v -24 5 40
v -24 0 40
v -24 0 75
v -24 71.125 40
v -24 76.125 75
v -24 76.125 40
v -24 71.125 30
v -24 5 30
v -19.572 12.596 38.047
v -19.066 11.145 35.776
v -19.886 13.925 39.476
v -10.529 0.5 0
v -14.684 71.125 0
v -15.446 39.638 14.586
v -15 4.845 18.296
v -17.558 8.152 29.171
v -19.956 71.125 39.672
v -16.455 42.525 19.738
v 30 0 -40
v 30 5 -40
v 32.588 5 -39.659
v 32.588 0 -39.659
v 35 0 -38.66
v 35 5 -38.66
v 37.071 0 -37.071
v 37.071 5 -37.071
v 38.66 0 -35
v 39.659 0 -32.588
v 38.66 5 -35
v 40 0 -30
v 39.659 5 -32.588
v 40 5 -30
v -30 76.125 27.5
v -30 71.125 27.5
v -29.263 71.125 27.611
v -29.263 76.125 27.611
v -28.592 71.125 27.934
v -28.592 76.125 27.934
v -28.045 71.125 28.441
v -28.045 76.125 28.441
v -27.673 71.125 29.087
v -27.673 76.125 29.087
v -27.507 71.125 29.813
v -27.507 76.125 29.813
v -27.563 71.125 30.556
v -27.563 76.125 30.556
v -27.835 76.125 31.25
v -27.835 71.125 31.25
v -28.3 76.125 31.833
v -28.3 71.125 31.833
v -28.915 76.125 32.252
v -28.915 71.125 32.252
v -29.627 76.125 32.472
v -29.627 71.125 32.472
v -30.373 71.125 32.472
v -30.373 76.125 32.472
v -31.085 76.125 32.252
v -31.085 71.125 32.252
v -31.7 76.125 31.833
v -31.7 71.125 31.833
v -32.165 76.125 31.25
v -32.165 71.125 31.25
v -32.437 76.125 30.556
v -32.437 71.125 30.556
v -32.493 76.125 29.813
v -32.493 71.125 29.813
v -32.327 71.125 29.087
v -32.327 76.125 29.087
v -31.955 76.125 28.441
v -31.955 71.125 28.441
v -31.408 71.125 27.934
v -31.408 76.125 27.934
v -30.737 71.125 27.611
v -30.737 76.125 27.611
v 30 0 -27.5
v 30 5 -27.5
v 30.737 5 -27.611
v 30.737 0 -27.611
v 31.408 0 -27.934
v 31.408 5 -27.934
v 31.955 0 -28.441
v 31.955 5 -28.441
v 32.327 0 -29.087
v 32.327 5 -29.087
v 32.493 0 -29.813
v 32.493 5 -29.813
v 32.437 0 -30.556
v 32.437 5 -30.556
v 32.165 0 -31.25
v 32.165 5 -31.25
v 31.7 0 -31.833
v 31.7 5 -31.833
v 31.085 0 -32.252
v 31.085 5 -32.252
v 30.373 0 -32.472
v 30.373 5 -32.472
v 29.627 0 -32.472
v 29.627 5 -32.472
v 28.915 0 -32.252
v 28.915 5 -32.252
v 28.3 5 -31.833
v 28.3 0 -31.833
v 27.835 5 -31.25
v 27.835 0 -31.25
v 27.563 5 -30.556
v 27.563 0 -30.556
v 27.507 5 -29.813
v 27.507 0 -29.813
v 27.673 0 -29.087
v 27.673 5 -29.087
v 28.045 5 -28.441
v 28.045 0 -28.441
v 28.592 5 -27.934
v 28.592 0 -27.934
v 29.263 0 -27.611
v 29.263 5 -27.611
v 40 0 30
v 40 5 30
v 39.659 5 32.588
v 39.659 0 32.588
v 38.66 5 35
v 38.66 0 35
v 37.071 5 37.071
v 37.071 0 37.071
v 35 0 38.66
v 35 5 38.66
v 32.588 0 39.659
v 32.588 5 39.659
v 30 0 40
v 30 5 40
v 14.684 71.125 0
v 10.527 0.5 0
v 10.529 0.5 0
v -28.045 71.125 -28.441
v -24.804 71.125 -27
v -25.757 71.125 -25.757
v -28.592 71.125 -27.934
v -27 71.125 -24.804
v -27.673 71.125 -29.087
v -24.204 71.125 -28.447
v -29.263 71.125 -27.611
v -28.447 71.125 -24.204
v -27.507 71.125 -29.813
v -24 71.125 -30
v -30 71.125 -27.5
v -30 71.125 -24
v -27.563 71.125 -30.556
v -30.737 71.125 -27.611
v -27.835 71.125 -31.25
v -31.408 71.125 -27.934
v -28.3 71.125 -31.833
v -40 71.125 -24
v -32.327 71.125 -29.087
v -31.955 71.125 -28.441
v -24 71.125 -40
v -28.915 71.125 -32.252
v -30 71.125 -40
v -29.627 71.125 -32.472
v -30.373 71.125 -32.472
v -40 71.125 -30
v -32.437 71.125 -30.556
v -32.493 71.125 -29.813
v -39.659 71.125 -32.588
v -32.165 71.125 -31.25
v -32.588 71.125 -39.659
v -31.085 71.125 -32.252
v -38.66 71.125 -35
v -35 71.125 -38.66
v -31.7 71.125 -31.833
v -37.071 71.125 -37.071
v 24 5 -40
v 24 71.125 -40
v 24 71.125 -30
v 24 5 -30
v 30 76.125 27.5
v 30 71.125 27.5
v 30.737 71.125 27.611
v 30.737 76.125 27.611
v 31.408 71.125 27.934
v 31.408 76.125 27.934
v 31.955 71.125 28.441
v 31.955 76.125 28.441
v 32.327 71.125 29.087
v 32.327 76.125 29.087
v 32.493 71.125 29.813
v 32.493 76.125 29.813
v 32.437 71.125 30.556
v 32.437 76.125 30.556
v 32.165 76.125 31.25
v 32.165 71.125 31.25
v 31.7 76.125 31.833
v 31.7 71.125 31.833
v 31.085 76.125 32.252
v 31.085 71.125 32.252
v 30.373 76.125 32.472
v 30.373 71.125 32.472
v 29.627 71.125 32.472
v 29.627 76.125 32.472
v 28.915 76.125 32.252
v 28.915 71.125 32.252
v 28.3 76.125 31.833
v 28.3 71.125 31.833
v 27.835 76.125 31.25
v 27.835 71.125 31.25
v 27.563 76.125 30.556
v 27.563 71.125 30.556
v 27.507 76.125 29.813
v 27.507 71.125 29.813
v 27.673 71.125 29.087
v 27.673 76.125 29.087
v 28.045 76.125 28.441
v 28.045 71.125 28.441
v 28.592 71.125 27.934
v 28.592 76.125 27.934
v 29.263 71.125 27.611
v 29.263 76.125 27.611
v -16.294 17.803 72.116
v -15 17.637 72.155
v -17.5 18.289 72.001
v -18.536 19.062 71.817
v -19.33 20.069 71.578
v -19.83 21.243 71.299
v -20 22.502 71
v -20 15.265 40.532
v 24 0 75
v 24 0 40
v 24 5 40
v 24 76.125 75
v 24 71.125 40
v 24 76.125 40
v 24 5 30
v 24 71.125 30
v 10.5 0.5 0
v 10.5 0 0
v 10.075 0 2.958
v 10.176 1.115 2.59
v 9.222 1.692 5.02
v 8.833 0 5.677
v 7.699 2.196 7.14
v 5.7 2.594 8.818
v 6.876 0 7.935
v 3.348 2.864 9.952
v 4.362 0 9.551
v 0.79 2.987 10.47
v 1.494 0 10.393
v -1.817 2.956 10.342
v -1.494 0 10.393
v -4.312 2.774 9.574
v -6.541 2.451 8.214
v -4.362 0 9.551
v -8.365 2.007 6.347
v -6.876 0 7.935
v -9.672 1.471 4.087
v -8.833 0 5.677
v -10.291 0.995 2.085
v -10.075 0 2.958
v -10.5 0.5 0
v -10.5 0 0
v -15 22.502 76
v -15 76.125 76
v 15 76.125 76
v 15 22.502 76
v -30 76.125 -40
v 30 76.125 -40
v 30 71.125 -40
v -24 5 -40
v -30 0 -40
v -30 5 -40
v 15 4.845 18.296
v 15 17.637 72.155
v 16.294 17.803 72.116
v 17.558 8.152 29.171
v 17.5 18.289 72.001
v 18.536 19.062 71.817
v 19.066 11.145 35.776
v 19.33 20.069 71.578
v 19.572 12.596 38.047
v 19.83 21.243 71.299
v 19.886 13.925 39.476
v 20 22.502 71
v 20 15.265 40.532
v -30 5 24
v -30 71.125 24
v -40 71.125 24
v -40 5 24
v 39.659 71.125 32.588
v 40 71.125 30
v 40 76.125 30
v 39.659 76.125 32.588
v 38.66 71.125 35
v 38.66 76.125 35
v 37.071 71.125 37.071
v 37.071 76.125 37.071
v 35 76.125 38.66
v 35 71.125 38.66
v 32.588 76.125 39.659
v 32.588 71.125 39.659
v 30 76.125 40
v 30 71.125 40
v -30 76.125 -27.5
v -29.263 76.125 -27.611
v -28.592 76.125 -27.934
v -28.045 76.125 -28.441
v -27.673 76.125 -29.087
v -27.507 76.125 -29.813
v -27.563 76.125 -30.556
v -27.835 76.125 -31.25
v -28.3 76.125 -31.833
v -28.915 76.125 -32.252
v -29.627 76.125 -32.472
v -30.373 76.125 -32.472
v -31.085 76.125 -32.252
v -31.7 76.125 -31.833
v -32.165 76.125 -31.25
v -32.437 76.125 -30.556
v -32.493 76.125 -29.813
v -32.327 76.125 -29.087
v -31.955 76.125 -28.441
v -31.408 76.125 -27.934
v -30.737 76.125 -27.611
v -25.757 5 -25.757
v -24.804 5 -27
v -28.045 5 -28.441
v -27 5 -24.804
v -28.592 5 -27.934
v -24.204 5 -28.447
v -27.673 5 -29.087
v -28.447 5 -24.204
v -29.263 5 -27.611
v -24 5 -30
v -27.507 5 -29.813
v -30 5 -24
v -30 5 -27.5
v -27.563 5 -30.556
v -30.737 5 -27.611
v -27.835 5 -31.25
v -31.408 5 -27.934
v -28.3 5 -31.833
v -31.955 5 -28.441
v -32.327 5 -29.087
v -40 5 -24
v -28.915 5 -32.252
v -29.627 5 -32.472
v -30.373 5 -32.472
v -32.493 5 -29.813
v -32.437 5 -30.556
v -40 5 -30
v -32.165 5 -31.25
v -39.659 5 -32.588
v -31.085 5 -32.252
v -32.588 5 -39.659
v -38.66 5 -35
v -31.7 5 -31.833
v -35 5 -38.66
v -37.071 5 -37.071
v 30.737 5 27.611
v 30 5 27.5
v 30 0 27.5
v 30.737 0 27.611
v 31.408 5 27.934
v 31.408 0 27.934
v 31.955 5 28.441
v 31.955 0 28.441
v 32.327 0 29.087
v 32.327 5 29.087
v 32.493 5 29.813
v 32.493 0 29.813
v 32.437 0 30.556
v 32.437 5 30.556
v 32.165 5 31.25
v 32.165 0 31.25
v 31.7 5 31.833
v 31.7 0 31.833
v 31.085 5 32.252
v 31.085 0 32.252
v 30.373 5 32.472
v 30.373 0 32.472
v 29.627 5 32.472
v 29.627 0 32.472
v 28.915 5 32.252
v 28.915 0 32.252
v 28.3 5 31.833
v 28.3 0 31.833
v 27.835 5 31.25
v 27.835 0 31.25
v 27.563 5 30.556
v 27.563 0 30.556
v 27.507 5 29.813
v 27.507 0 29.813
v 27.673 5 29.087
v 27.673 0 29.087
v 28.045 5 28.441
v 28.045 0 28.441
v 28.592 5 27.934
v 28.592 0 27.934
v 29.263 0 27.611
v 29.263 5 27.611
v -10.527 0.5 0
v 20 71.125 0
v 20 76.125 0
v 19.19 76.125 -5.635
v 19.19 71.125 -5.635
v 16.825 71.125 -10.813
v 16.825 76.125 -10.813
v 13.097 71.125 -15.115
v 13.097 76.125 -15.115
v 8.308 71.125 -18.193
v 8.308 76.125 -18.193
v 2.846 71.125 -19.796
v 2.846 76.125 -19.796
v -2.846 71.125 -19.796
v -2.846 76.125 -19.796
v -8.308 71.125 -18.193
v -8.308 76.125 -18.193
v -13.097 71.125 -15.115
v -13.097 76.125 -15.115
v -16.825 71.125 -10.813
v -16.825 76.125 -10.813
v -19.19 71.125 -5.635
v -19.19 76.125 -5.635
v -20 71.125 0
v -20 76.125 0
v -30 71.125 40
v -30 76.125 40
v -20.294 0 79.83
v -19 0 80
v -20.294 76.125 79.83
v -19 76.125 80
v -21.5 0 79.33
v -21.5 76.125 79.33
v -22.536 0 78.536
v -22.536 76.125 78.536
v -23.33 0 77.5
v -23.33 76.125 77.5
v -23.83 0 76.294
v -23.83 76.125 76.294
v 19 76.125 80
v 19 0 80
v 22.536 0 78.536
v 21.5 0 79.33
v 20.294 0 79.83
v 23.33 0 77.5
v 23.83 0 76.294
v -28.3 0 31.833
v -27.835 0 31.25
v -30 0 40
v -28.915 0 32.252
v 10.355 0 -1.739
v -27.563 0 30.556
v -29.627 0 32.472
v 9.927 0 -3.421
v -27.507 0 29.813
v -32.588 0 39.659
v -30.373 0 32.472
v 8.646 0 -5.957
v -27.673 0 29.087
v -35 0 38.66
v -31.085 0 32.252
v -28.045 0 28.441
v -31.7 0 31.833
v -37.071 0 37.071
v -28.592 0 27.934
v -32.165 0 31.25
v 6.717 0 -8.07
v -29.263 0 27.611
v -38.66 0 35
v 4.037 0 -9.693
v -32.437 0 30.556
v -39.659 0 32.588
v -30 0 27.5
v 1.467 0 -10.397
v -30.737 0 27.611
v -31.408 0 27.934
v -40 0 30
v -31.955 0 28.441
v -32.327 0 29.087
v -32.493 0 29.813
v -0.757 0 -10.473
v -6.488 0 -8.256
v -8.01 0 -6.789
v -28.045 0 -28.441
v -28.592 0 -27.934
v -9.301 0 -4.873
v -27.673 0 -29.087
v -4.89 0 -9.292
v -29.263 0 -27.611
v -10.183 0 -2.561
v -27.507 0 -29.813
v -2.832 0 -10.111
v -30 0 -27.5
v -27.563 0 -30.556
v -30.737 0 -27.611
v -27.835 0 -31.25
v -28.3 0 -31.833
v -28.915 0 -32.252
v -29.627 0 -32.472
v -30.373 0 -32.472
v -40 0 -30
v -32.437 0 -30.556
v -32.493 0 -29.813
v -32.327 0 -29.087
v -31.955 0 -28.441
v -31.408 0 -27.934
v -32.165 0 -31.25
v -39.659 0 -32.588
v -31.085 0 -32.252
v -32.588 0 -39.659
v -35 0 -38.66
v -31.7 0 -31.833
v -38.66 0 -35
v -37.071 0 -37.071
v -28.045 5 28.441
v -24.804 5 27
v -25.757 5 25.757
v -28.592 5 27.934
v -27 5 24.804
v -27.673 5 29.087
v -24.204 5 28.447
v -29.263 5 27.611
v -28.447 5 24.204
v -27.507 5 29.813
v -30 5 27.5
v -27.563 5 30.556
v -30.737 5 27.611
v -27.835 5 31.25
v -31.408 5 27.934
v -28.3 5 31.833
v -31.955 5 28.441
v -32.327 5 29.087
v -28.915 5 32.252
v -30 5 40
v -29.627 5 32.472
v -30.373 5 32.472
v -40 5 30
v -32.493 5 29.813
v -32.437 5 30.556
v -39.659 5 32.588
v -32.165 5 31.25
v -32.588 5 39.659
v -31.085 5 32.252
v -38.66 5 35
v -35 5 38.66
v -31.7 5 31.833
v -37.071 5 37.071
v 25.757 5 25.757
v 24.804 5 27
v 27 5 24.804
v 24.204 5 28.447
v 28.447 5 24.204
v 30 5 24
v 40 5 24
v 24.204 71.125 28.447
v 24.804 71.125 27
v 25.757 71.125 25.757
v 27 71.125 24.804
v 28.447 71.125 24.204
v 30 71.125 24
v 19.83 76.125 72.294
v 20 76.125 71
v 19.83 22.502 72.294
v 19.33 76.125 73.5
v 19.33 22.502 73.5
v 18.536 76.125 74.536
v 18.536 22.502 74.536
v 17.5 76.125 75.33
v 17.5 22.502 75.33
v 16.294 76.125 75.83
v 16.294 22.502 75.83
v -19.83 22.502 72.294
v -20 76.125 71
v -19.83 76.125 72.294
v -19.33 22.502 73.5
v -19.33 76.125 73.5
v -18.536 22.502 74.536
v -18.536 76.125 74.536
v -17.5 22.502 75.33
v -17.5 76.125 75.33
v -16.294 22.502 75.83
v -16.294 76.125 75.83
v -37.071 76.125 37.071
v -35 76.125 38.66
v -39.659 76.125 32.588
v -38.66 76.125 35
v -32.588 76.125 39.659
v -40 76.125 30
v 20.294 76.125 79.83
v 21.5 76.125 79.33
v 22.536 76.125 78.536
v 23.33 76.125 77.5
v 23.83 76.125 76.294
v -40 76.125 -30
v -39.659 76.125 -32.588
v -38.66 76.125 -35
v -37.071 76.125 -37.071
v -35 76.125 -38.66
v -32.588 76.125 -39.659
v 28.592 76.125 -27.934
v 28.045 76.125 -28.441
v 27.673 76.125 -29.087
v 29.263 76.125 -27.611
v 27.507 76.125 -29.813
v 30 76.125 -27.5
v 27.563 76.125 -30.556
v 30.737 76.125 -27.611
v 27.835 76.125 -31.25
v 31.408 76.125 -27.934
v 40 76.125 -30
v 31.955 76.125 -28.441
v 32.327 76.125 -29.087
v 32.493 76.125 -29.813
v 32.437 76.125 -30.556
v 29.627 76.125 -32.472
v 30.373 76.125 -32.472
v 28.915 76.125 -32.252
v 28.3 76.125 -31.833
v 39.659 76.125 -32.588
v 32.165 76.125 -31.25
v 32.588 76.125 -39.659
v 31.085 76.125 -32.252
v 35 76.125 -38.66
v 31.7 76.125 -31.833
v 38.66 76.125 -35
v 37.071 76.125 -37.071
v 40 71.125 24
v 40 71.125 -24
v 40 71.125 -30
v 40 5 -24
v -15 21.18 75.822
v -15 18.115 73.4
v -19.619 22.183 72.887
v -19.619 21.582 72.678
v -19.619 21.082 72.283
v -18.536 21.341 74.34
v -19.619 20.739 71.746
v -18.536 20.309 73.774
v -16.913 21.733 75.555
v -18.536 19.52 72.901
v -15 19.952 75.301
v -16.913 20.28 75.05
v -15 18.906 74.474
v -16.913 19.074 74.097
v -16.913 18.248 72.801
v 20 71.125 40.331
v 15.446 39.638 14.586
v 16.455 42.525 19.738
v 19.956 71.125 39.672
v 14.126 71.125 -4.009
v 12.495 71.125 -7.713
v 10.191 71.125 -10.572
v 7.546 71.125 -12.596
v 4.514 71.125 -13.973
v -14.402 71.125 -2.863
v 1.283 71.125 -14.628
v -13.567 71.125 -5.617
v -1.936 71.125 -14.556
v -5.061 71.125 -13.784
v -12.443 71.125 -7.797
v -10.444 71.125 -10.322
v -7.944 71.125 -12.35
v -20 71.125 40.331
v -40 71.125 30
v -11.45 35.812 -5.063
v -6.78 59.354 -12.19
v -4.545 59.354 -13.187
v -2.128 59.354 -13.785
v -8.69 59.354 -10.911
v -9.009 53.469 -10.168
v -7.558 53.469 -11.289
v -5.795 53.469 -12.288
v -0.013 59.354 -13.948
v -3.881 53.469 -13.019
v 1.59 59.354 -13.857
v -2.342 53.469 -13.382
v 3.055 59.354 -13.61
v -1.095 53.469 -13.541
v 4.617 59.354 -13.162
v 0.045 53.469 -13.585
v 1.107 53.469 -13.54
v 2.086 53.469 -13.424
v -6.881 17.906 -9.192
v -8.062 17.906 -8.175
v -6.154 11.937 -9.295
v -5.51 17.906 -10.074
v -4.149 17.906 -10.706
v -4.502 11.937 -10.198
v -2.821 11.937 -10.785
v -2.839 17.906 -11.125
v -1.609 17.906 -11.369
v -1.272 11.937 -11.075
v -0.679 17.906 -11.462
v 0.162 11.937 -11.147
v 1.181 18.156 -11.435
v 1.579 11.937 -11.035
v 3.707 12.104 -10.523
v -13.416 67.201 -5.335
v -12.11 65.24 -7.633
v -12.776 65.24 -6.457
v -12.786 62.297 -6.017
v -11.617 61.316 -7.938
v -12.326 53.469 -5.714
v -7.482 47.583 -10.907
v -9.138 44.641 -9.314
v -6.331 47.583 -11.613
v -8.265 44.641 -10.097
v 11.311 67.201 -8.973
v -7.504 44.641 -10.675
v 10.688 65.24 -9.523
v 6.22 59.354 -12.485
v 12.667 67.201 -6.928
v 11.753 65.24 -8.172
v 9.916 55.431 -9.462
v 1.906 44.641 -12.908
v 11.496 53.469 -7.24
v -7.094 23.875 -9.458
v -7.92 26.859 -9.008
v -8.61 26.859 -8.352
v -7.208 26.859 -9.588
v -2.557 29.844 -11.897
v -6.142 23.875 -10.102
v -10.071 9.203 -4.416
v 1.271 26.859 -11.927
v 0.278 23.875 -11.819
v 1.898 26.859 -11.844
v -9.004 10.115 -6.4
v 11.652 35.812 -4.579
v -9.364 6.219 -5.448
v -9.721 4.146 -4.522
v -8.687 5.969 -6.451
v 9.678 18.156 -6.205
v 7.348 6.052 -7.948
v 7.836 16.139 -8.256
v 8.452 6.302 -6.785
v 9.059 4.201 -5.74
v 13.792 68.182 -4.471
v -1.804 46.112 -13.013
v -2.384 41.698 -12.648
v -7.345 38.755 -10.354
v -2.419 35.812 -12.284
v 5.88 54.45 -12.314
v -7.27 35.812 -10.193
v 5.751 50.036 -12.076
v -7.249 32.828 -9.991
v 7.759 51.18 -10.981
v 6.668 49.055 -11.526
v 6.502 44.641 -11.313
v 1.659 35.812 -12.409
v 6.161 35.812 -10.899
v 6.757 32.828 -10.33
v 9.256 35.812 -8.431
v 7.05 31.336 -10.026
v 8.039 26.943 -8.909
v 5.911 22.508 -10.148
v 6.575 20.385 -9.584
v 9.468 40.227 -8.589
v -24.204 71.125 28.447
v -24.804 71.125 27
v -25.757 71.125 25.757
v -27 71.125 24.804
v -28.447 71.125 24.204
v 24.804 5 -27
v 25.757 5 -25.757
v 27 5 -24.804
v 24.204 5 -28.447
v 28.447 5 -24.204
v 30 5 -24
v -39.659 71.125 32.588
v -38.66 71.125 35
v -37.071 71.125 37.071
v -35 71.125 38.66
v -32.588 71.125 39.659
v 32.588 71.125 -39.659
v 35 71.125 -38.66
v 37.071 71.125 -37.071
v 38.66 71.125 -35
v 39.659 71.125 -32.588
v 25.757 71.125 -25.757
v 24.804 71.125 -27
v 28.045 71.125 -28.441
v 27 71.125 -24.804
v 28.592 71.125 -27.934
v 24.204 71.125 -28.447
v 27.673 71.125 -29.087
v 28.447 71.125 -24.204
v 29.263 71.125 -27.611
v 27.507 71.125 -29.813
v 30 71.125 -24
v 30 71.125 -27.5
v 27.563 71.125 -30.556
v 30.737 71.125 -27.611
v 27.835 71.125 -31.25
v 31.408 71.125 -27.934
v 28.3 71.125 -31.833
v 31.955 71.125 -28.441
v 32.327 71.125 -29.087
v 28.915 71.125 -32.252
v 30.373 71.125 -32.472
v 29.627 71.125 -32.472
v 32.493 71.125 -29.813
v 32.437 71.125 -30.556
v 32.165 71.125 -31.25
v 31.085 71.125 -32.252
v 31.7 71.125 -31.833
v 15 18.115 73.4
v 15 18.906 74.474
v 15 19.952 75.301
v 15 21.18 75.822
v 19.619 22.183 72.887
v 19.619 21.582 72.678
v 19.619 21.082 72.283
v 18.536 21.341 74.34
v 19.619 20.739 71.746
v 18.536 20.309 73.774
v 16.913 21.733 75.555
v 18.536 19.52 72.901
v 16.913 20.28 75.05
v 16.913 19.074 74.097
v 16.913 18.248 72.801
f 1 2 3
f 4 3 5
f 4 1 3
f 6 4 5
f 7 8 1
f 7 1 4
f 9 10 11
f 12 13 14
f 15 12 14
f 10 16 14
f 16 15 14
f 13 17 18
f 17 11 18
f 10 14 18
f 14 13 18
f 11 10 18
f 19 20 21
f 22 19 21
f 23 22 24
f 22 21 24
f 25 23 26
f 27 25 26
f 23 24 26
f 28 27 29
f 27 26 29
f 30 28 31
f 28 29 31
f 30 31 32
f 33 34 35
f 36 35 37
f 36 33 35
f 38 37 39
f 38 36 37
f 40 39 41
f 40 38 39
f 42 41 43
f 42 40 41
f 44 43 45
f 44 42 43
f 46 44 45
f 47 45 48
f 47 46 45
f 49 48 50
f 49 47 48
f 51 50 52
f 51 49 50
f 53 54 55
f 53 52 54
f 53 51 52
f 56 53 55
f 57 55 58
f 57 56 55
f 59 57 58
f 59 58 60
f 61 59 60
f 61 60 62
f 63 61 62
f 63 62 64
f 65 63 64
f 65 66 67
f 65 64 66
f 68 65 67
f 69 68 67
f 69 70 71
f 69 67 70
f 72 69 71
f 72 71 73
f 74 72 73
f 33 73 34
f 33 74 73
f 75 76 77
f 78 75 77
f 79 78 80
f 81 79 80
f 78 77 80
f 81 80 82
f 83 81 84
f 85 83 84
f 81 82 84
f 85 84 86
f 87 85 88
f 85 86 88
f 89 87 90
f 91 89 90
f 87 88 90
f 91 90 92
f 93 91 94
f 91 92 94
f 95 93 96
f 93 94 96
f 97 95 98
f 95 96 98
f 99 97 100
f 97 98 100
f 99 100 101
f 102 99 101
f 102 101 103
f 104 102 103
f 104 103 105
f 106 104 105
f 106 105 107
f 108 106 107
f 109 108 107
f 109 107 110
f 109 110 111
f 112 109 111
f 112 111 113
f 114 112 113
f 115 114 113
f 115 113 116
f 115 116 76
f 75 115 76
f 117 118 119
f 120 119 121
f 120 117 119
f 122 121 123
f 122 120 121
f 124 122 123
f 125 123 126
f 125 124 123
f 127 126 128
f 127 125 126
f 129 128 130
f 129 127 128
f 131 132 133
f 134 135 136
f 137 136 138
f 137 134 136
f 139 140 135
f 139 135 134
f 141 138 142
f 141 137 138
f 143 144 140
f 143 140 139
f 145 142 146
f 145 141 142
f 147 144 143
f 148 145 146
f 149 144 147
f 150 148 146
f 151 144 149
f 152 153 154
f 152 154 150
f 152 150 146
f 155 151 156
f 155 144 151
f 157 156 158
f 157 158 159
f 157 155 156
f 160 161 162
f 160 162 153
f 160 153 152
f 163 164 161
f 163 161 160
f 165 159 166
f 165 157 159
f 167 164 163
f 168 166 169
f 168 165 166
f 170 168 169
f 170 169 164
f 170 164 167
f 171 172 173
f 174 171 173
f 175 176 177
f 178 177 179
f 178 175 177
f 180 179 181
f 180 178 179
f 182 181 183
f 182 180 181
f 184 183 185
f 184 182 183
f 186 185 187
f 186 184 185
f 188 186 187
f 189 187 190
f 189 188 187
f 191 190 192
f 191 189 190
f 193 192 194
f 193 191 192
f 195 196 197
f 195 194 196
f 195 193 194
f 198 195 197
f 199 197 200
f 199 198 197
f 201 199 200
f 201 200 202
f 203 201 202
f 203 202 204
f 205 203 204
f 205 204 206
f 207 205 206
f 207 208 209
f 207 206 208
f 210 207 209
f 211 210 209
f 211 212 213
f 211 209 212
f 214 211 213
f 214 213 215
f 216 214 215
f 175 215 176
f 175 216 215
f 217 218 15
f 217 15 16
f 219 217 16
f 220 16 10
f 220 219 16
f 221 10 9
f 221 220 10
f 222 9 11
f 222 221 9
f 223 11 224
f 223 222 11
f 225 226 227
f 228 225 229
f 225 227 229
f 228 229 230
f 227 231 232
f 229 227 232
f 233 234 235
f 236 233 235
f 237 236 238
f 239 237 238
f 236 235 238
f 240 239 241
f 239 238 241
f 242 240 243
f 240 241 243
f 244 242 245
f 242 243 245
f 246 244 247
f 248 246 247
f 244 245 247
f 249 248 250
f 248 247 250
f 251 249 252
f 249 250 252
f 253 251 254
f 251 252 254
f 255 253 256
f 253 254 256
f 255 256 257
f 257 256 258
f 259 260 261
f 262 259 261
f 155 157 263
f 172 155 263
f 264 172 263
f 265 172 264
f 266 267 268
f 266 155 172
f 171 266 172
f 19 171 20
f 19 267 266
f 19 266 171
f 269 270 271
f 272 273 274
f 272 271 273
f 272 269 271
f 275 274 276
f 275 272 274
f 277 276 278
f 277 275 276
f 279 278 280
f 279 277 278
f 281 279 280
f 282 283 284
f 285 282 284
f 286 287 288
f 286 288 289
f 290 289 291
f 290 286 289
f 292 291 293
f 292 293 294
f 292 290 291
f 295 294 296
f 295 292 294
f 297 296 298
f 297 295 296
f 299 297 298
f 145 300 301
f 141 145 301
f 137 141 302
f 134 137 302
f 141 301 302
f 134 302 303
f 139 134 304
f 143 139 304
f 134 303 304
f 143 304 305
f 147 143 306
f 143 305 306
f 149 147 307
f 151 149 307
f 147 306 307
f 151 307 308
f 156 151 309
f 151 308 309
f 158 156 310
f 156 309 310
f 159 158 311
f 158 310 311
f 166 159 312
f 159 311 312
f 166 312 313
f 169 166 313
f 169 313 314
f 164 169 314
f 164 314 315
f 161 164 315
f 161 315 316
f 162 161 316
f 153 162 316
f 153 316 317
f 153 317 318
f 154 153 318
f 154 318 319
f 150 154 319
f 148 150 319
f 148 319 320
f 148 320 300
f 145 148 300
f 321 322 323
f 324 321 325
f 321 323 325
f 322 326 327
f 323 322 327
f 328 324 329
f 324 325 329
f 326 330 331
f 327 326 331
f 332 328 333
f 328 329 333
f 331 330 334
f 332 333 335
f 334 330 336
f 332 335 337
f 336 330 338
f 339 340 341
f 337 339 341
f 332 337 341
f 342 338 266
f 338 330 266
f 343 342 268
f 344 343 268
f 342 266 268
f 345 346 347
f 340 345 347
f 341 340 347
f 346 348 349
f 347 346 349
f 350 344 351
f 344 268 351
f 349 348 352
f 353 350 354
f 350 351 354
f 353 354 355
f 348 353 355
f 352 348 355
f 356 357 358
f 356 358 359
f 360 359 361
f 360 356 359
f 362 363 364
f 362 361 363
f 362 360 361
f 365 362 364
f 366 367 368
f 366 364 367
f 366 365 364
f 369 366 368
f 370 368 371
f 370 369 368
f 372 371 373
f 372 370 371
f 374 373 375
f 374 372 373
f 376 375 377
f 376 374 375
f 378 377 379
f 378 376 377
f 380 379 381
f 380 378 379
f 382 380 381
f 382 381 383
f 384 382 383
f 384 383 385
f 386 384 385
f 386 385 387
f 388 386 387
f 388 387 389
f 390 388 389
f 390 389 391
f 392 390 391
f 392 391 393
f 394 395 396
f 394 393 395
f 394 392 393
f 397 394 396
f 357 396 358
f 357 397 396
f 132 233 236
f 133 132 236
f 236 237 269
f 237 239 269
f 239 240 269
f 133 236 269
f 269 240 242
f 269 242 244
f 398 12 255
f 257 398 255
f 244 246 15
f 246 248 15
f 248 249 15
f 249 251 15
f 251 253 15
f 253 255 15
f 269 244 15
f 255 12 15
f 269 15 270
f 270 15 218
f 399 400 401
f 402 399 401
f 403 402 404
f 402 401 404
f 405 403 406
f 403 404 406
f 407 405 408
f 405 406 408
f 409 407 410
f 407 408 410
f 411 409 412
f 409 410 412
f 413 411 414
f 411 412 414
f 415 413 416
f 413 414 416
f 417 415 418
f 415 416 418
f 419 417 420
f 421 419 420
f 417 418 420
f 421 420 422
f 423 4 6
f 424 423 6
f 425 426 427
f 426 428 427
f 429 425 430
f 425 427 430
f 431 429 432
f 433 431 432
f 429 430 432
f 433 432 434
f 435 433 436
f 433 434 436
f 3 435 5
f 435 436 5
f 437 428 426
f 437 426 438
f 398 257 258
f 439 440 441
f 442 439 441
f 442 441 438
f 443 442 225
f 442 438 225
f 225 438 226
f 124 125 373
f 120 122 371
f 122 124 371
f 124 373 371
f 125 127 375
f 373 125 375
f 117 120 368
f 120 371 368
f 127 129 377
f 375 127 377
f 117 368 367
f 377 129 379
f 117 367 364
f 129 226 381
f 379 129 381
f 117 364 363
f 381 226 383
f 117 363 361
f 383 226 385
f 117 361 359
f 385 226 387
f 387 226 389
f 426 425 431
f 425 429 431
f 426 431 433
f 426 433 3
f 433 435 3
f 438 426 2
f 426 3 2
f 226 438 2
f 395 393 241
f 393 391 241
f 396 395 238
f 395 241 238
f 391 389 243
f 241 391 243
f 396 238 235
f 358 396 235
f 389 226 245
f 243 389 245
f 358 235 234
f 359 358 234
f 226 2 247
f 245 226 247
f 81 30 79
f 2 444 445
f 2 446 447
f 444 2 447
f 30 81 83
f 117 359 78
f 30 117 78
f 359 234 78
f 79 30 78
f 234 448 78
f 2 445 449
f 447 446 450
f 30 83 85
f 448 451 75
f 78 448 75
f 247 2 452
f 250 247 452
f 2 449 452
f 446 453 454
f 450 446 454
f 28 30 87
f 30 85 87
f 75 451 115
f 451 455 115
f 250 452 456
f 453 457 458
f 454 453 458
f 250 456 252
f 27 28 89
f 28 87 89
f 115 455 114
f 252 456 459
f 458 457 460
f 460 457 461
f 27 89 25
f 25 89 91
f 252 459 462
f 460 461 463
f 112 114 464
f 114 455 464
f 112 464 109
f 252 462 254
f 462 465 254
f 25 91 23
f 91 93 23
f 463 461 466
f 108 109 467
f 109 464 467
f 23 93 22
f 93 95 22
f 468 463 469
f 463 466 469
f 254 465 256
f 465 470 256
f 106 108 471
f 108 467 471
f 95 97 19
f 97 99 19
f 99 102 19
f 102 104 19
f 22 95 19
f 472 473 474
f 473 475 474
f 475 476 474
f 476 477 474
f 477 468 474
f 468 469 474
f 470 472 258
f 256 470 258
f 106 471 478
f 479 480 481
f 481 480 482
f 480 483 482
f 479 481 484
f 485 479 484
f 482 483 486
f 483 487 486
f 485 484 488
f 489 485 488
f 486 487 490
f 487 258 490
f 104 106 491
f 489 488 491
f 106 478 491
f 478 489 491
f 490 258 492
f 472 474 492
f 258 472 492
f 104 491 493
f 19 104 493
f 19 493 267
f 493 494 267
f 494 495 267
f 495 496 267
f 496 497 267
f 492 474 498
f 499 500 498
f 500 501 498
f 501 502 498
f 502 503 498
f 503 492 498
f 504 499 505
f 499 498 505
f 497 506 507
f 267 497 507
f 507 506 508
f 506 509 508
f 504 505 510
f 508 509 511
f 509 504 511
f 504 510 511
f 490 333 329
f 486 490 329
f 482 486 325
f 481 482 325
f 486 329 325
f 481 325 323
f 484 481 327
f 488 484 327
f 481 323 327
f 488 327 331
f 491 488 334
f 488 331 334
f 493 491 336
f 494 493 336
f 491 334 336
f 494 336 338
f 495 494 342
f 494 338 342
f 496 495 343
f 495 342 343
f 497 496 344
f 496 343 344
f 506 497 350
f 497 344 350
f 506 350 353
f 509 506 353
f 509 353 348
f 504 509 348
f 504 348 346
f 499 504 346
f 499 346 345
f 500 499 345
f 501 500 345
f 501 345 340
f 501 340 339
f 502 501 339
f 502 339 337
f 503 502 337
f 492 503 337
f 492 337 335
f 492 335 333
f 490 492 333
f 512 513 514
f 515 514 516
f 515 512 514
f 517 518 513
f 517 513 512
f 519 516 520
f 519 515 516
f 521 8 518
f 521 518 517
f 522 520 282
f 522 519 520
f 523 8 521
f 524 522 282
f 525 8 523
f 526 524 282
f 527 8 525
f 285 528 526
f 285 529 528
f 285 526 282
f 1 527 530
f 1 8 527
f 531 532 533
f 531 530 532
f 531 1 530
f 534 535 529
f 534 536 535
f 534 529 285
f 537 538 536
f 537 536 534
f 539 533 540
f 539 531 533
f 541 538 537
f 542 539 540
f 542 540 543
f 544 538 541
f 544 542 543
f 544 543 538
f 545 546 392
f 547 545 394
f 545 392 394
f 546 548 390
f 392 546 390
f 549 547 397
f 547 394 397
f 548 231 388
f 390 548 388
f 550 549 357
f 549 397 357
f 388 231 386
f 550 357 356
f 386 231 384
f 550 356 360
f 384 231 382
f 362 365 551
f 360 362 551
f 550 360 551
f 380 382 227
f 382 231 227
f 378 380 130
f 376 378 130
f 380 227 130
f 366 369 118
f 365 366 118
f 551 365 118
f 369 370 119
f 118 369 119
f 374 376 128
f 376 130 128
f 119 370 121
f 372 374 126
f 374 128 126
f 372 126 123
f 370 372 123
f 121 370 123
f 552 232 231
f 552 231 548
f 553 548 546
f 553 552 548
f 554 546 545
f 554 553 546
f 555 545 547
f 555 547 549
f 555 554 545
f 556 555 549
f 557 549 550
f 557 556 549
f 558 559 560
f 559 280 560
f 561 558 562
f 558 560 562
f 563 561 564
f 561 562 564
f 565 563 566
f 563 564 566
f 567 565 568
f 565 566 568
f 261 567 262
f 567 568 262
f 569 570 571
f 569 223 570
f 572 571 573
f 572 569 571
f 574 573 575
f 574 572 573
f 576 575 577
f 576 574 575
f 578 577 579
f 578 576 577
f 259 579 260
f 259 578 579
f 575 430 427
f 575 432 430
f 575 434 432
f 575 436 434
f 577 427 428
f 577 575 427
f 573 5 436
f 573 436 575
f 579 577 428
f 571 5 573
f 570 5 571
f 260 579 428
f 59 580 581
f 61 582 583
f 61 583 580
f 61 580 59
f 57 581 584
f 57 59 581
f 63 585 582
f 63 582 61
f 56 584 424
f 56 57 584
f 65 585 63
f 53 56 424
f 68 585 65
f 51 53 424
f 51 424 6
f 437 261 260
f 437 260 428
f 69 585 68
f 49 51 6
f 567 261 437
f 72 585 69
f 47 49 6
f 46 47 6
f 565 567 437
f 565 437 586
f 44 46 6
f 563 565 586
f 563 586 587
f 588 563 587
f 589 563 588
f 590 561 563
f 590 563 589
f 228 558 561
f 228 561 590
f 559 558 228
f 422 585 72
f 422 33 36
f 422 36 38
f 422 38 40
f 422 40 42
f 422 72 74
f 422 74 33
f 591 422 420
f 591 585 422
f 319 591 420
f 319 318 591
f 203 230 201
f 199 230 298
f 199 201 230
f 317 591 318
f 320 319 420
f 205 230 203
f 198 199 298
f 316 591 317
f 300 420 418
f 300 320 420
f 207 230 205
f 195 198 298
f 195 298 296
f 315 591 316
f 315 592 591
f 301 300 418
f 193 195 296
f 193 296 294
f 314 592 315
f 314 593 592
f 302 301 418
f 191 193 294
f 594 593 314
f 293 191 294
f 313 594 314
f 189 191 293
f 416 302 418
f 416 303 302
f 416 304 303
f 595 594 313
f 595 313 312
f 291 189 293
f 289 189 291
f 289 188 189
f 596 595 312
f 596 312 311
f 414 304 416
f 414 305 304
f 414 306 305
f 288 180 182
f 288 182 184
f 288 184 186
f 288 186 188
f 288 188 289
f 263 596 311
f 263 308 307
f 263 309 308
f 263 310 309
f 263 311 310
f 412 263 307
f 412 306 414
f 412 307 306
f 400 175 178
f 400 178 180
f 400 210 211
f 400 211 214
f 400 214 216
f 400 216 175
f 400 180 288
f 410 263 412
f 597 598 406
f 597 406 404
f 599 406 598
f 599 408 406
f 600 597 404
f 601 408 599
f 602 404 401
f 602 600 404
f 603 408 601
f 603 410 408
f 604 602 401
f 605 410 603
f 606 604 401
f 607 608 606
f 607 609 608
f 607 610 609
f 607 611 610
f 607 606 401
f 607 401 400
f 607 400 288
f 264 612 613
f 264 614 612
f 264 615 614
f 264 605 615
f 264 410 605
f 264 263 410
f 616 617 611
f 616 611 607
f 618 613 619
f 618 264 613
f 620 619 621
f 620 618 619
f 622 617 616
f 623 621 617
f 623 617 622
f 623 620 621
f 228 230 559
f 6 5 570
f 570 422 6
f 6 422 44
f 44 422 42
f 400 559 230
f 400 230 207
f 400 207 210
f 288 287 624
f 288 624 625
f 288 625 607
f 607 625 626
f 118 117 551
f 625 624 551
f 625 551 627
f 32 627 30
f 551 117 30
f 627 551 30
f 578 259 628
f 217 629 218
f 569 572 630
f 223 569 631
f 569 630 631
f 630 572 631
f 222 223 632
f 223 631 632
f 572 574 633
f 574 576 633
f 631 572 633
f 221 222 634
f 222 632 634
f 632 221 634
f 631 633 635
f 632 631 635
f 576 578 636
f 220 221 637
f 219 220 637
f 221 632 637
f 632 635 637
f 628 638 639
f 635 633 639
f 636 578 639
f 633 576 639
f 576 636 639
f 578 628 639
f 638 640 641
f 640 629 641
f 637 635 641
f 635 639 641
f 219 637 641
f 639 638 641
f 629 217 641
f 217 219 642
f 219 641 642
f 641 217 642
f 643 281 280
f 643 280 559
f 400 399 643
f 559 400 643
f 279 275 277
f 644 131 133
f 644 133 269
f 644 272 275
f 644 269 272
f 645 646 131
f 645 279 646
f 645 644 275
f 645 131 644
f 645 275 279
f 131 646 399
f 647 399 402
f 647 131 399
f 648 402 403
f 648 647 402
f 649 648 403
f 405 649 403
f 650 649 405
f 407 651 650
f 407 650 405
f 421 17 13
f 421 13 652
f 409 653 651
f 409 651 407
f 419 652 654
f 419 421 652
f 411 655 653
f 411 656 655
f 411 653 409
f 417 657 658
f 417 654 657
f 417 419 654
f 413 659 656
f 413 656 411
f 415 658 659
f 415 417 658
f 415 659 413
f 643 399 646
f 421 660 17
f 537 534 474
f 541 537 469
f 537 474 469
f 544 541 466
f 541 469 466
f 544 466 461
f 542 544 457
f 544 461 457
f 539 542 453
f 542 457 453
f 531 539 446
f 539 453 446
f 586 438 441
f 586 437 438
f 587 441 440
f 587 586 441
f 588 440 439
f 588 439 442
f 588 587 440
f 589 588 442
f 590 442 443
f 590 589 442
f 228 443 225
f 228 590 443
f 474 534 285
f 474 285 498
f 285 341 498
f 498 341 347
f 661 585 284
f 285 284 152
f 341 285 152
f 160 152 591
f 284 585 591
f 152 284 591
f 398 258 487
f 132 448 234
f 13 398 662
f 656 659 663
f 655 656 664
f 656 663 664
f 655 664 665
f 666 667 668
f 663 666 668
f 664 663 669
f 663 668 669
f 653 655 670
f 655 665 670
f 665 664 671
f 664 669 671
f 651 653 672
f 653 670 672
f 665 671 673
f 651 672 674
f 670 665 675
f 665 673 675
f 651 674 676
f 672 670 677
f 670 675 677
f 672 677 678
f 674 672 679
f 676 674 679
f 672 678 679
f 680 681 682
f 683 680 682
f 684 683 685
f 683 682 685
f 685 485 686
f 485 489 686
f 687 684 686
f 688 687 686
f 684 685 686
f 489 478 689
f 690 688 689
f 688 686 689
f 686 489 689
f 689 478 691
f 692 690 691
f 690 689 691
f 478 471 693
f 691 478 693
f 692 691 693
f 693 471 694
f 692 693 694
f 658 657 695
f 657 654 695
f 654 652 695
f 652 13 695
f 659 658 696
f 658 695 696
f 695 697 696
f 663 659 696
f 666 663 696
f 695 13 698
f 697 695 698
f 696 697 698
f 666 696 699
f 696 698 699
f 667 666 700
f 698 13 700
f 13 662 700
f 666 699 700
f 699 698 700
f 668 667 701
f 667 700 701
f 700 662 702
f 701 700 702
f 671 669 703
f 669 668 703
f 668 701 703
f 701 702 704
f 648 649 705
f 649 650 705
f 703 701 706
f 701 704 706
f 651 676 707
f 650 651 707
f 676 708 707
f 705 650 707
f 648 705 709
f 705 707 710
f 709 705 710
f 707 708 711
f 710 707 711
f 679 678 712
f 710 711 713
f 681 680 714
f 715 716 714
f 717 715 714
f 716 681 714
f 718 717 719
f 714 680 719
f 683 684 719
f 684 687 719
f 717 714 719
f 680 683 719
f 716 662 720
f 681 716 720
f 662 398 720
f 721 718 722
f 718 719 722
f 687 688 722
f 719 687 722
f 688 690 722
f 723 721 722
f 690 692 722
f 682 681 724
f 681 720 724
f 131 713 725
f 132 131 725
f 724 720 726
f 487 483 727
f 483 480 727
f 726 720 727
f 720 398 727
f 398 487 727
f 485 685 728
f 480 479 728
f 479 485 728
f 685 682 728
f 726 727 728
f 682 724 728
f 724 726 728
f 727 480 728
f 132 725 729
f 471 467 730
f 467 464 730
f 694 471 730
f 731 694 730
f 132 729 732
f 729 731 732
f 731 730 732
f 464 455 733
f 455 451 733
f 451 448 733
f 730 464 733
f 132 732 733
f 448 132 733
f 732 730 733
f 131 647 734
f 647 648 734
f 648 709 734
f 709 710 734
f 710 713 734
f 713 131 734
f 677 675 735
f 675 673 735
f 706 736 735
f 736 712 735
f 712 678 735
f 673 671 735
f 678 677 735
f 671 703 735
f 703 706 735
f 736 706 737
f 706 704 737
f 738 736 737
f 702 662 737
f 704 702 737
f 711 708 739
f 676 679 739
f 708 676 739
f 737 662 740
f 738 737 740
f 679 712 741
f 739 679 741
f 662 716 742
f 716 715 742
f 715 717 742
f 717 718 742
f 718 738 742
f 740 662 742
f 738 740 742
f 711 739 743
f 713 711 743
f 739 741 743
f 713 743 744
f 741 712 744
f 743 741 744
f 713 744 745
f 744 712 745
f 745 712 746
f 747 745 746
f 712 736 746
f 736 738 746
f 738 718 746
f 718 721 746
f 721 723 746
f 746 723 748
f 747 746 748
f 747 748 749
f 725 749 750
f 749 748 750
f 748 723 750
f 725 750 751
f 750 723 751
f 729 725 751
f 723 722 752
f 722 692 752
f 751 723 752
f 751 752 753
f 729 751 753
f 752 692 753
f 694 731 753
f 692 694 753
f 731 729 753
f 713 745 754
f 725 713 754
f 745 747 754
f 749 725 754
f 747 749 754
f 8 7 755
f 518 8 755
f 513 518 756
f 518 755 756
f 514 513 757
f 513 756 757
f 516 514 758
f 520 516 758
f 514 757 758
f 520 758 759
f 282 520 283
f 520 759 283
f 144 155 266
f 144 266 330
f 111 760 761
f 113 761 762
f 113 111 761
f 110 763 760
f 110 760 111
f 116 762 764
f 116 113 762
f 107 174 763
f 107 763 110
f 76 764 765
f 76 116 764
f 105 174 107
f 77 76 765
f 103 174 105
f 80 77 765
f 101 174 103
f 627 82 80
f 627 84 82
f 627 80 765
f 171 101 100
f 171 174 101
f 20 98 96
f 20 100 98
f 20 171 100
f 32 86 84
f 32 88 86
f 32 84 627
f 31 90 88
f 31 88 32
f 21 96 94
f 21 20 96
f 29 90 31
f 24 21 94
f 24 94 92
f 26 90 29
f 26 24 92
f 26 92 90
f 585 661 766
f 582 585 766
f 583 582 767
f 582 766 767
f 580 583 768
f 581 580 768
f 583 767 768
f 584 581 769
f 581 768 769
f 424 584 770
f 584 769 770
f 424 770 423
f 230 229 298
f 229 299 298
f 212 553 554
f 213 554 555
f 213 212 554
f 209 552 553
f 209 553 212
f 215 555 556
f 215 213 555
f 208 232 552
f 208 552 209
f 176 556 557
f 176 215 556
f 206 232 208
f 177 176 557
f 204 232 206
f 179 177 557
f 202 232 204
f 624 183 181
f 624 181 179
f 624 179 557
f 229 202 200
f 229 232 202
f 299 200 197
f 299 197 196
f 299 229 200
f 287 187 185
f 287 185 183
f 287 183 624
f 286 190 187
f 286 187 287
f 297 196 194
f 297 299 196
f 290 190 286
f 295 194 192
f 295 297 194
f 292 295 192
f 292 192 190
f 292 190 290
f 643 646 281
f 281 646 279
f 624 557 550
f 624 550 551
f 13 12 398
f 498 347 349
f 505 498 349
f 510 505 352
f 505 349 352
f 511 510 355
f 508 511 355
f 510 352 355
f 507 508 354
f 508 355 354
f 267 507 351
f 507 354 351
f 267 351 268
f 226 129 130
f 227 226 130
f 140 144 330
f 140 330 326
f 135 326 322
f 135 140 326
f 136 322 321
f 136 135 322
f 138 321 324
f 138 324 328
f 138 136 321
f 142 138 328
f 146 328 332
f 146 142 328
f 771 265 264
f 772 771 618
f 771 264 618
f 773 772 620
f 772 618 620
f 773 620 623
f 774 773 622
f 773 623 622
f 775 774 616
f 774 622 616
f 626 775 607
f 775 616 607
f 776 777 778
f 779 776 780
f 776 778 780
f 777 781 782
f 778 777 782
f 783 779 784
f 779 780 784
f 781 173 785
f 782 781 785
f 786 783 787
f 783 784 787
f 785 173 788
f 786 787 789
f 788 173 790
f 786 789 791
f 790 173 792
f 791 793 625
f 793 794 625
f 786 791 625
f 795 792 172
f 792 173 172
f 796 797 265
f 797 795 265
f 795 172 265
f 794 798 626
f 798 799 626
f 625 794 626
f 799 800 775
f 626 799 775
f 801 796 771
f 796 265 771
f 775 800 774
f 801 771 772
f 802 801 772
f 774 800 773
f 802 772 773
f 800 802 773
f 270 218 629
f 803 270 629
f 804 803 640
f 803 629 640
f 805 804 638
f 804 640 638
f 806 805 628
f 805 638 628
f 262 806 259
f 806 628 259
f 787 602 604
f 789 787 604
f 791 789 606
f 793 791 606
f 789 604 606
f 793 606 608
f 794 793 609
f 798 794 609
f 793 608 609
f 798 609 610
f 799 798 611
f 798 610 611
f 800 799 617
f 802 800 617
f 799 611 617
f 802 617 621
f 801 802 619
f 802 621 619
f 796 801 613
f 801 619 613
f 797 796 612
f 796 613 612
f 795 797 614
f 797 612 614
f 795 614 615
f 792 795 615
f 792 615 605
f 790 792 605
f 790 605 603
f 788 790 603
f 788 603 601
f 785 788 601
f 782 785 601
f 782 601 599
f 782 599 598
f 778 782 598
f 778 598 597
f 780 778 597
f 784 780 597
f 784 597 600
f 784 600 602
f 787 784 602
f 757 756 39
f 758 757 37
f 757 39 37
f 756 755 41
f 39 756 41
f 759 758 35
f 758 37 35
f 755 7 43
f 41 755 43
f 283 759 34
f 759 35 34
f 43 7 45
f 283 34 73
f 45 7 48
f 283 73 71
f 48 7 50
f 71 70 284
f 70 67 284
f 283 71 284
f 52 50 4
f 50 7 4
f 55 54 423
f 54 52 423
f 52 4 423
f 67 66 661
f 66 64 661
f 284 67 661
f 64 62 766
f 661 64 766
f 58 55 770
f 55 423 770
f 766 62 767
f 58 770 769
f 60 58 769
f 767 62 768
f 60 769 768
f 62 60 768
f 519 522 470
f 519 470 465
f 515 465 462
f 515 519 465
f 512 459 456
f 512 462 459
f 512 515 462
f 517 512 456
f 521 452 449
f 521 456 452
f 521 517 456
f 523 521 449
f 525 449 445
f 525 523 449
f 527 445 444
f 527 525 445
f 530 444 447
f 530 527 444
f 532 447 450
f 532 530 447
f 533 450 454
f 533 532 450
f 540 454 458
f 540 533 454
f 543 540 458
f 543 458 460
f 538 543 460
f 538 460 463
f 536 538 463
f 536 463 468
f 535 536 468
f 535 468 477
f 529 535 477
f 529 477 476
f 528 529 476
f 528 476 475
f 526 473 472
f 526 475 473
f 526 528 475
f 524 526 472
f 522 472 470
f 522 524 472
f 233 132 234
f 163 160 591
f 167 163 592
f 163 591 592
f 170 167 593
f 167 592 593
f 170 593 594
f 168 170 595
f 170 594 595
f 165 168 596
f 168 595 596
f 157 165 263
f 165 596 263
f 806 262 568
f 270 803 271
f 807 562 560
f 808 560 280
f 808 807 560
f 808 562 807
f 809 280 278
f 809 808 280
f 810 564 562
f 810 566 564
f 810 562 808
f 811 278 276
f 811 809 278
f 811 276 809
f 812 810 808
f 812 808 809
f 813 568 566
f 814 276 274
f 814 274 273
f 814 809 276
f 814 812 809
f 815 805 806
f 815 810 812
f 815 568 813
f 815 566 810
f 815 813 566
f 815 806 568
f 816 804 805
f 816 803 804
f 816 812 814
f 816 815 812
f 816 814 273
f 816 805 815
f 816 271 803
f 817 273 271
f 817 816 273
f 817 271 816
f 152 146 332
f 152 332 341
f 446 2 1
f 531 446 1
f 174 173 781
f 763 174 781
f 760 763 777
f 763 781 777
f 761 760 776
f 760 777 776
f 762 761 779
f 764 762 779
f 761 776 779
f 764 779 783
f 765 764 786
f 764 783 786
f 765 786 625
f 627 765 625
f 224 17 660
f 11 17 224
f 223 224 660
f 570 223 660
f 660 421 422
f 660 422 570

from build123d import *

# Parameters (mm, degrees)
SKETCH1_W                       = 80
SKETCH1_H                       = 40
BOSS_EXTRUDE1_DEPTH             = 76.125
FILLET1_R                       = 10
CUT_EXTRUDE1_START              = -66.125
CUT_EXTRUDE1_DEPTH              = 66.125
SKETCH5_R                       = 2.5
CUT_EXTRUDE2_DEPTH              = 95.842056369
SKETCH6_R                       = 20
CUT_EXTRUDE3_DEPTH              = 5
SKETCH7_W                       = 20
SKETCH7_H                       = 40
BOSS_EXTRUDE3_DEPTH             = 76.125
FILLET2_R                       = 10
MIRROR2_START                   = -66.125
MIRROR2_COPY_1_DEPTH            = 66.125
BOSS_EXTRUDE4_REACH             = 96.842
BOSS_EXTRUDE4_DIRECTION_2_REACH = 96.842
CUT_EXTRUDE4_REACH              = 96.842
SKETCH12_R                      = 10.5
SKETCH13_W                      = 4
SKETCH13_H                      = 76.125
BOSS_EXTRUDE5_DEPTH             = 40
BOSS_EXTRUDE6_REACH             = 127.678
BOSS_EXTRUDE7_REACH             = 119.452
SKETCH15_W                      = 40
SKETCH15_H                      = 4
FILLET3_R                       = 5


with BuildPart() as part:
    # Sketch1 → Boss-Extrude1 (new body)
    with BuildSketch(Plane(origin=(0, 0, 0), x_dir=(1, 0, 0), z_dir=(0, 1, 0))):
        with Locations((0, 20)):
            Rectangle(SKETCH1_W, SKETCH1_H)
    extrude(amount=BOSS_EXTRUDE1_DEPTH)

    # Cut-Loft1: read off the stored shape, not the designer's step
    # Cut-Loft1: loft between two sections, ruled curve by curve
    cut_loft1_from = [
        Edge.make_bspline([(-2.197461017, 76.125, 14.838165826), (-31.873792669, 76.125, 10.443243791), (-27.478870634, 76.125, -19.233087861), (2.197461017, 76.125, -14.838165826), (31.873792669, 76.125, -10.443243791), (27.478870634, 76.125, 19.233087861), (-2.197461017, 76.125, 14.838165826)], [0, 0, 0, 0, 0.5, 0.5, 0.5, 1, 1, 1, 1], 3, [1, 0.333333333, 0.333333333, 1, 0.333333333, 0.333333333, 1]),
    ]
    cut_loft1_to = [
        Edge.make_bspline([(1.080050789, 0, 10.444304203), (-19.808557618, 0, 12.604405781), (-21.968659196, 0, -8.284202626), (-1.080050789, 0, -10.444304203), (19.808557618, 0, -12.604405781), (21.968659196, 0, 8.284202626), (1.080050789, 0, 10.444304203)], [0, 0, 0, 0, 0.5, 0.5, 0.5, 1, 1, 1, 1], 3, [1, 0.333333333, 0.333333333, 1, 0.333333333, 0.333333333, 1]),
    ]
    cut_loft1 = Solid(Shell([*[Face.make_surface_from_curves(cut_loft1_from[k], cut_loft1_to[k]) for k in range(1)], Face(Wire(cut_loft1_from)), Face(Wire(cut_loft1_to))]))
    add(cut_loft1, mode=Mode.SUBTRACT)

    # Fillet1
    fillet1_edges = [part.edges().sort_by_distance(p)[0] for p in [
        (-40, 38.0625, -40),
        (40, 38.0625, -40),
    ]]
    fillet(fillet1_edges, radius=FILLET1_R)

    # Sketch4 → Cut-Extrude1 (cut)
    with BuildSketch(Plane(origin=(0, 5, 0), x_dir=(-1, 0, 0), z_dir=(0, -1, 0)).offset(CUT_EXTRUDE1_START)):
        with BuildLine():
            Line((-40, 24), (-40, 30))
            ThreePointArc((-40, 30), (-37.071067812, 37.071067812), (-30, 40))
            Line((-30, 40), (-24, 40))
            Line((-24, 40), (-24, 30))
            ThreePointArc((-24, 30), (-25.757359313, 25.757359313), (-30, 24))
            Line((-30, 24), (-40, 24))
        make_face()
    cut_extrude1 = extrude(amount=CUT_EXTRUDE1_DEPTH, mode=Mode.SUBTRACT)

    # Sketch5 → Cut-Extrude2 (cut, through all)
    with BuildSketch(Plane(origin=(0, 76.125, 0), x_dir=(1, 0, 0), z_dir=(0, 1, 0))):
        with Locations(Location((30, 30, 0), (0, 0, 270))):
            Circle(SKETCH5_R)
        with Locations(Location((-30, 30, 0), (0, 0, 270))):
            Circle(SKETCH5_R)
    cut_extrude2 = extrude(amount=-CUT_EXTRUDE2_DEPTH, mode=Mode.SUBTRACT)

    # Sketch6 → Cut-Extrude3 (cut)
    with BuildSketch(Plane(origin=(0, 76.125, 0), x_dir=(1, 0, 0), z_dir=(0, 1, 0))):
        Circle(SKETCH6_R)
    extrude(amount=-CUT_EXTRUDE3_DEPTH, mode=Mode.SUBTRACT)

    # Mirror1: Cut-Extrude1 across plane
    add(cut_extrude1.mirror(Plane(origin=(0, 0, 0), x_dir=(0, 0, 1), z_dir=(1, 0, 0))), mode=Mode.SUBTRACT)

    # Sketch7 → Boss-Extrude3 (add)
    with BuildSketch(Plane(origin=(0, 76.125, 0), x_dir=(1, 0, 0), z_dir=(0, 1, 0))):
        with Locations((-30, -20)):
            Rectangle(SKETCH7_W, SKETCH7_H)
        with Locations((30, -20)):
            Rectangle(SKETCH7_W, SKETCH7_H)
    extrude(amount=-BOSS_EXTRUDE3_DEPTH)

    # Fillet2
    fillet2_edges = [part.edges().sort_by_distance(p)[0] for p in [
        (-40, 38.0625, 40),
        (40, 38.0625, 40),
    ]]
    fillet(fillet2_edges, radius=FILLET2_R)

    # Mirror2: Cut-Extrude1, Cut-Extrude2 across plane
    add(cut_extrude1.mirror(Plane.XY), mode=Mode.SUBTRACT)
    add(cut_extrude2.mirror(Plane.XY), mode=Mode.SUBTRACT)

    # Mirror2 copy 1 sketch → Mirror2 copy 1 (cut)
    with BuildSketch(Plane.XZ.offset(-5).offset(MIRROR2_START)):
        with BuildLine():
            Line((-40, 24), (-40, 30))
            ThreePointArc((-40, 30), (-37.071067812, 37.071067812), (-30, 40))
            Line((-30, 40), (-24, 40))
            Line((-24, 40), (-24, 30))
            ThreePointArc((-24, 30), (-25.757359313, 25.757359313), (-30, 24))
            Line((-30, 24), (-40, 24))
        make_face()
    extrude(amount=MIRROR2_COPY_1_DEPTH, mode=Mode.SUBTRACT)

    # Sketch9 → Loft1 section 0
    with BuildSketch(Plane.XZ):
        with BuildLine():
            Line((20, 40), (20, 0))
            Line((20, 0), (10.5, 0))
            Line((10.5, 0), (20, 40))
        make_face()
    # Sketch8 → Loft1 section 1
    with BuildSketch(Plane(origin=(0, 71.125, 0), x_dir=(1, 0, 0), z_dir=(0, 1, 0))):
        with BuildLine():
            Line((14.683973591, 0), (20, -40))
            Line((20, -40), (20, 0))
            Line((20, 0), (14.683973591, 0))
        make_face()
    loft1 = loft()

    # Mirror3: Loft1 across plane
    add(loft1.mirror(Plane(origin=(0, 0, 0), x_dir=(0, 0, 1), z_dir=(1, 0, 0))))

    # Sketch11 → Boss-Extrude4 (add, up to next)
    with BuildSketch(Plane(origin=(0, 0, 0), x_dir=(0, 0, -1), z_dir=(1, 0, 0)), mode=Mode.PRIVATE) as boss_extrude4_sk1:
        Polygon((0, 0), (-40, 0), (-40, 10), (0, 0.5), align=None)
    boss_extrude4_tool1 = extrude(boss_extrude4_sk1.sketch, amount=BOSS_EXTRUDE4_REACH, mode=Mode.PRIVATE) - part.part
    add(boss_extrude4_tool1.solids().sort_by_distance((0, 3.34127, 26.031746))[0])

    # Sketch11 → Boss-Extrude4 direction 2 (add, up to next)
    with BuildSketch(Plane(origin=(0, 0, 0), x_dir=(0, 0, -1), z_dir=(1, 0, 0)), mode=Mode.PRIVATE) as boss_extrude4_direction_2_sk1:
        Polygon((0, 0), (-40, 0), (-40, 10), (0, 0.5), align=None)
    boss_extrude4_direction_2_tool1 = extrude(boss_extrude4_direction_2_sk1.sketch, amount=-BOSS_EXTRUDE4_DIRECTION_2_REACH, mode=Mode.PRIVATE) - part.part
    add(boss_extrude4_direction_2_tool1.solids().sort_by_distance((0, 3.34127, 26.031746))[0])

    # Sketch12 → Cut-Extrude4 (cut, up to next)
    with BuildSketch(Plane(origin=(0, 0, 0), x_dir=(-1, 0, 0), z_dir=(0, -1, 0)), mode=Mode.PRIVATE) as cut_extrude4_sk1:
        Circle(SKETCH12_R)
    cut_extrude4_tool1 = extrude(cut_extrude4_sk1.sketch, amount=-CUT_EXTRUDE4_REACH, mode=Mode.PRIVATE) & part.part
    add(cut_extrude4_tool1.solids().sort_by_distance((0, 0, 0))[0], mode=Mode.SUBTRACT)

    # Sketch13 → Boss-Extrude5 (add)
    with BuildSketch(Plane.XY.offset(40)):
        with Locations((-22, 38.0625)):
            Rectangle(SKETCH13_W, SKETCH13_H)
    boss_extrude5 = extrude(amount=BOSS_EXTRUDE5_DEPTH)

    # Mirror4: Boss-Extrude5 across plane
    add(boss_extrude5.mirror(Plane(origin=(0, 0, 0), x_dir=(0, 0, 1), z_dir=(1, 0, 0))))

    # Sketch14 → Boss-Extrude6 (add, up to next)
    with BuildSketch(Plane(origin=(-20, 0, 0), x_dir=(0, 0, -1), z_dir=(1, 0, 0)), mode=Mode.PRIVATE) as boss_extrude6_sk1:
        Polygon((-40, 10), (-80, 19.5), (-80, 0), (-40, 0), align=None)
    boss_extrude6_tool1 = extrude(boss_extrude6_sk1.sketch, amount=BOSS_EXTRUDE6_REACH, mode=Mode.PRIVATE) - part.part
    add(boss_extrude6_tool1.solids().sort_by_distance((-20, 7.629944, 62.146893))[0])

    # Boss-Extrude7: up to this plane
    boss_extrude7_end = Plane(origin=(-500000, 0.5, 0), z_dir=(0, 0.9729365507195606, -0.23107243079589554))
    # Sketch15 → Boss-Extrude7 (add, up to the surface)
    with BuildSketch(Plane(origin=(0, 76.125, 0), x_dir=(1, 0, 0), z_dir=(0, 1, 0)), mode=Mode.PRIVATE) as boss_extrude7_sk1:
        with Locations((0, -78)):
            Rectangle(SKETCH15_W, SKETCH15_H)
    boss_extrude7_tool1 = split(extrude(boss_extrude7_sk1.sketch, amount=-BOSS_EXTRUDE7_REACH, mode=Mode.PRIVATE), bisect_by=boss_extrude7_end, keep=Keep.BOTH, mode=Mode.PRIVATE)
    add(boss_extrude7_tool1.solids().sort_by_distance((0, 76.125, 78))[0])

    # Fillet3
    fillet3_edges = [part.edges().sort_by_distance(p)[0] for p in [
        (-20, 40.5625, 40),
        (20, 40.5625, 40),
        (-24, 38.0625, 80),
        (24, 38.0625, 80),
        (-20, 14.275, 58),
        (20, 14.275, 58),
        (0, 18.55, 76),
        (-20, 47.3375, 76),
        (20, 47.3375, 76),
    ]]
    fillet(fillet3_edges, radius=FILLET3_R)


solid = part.part
